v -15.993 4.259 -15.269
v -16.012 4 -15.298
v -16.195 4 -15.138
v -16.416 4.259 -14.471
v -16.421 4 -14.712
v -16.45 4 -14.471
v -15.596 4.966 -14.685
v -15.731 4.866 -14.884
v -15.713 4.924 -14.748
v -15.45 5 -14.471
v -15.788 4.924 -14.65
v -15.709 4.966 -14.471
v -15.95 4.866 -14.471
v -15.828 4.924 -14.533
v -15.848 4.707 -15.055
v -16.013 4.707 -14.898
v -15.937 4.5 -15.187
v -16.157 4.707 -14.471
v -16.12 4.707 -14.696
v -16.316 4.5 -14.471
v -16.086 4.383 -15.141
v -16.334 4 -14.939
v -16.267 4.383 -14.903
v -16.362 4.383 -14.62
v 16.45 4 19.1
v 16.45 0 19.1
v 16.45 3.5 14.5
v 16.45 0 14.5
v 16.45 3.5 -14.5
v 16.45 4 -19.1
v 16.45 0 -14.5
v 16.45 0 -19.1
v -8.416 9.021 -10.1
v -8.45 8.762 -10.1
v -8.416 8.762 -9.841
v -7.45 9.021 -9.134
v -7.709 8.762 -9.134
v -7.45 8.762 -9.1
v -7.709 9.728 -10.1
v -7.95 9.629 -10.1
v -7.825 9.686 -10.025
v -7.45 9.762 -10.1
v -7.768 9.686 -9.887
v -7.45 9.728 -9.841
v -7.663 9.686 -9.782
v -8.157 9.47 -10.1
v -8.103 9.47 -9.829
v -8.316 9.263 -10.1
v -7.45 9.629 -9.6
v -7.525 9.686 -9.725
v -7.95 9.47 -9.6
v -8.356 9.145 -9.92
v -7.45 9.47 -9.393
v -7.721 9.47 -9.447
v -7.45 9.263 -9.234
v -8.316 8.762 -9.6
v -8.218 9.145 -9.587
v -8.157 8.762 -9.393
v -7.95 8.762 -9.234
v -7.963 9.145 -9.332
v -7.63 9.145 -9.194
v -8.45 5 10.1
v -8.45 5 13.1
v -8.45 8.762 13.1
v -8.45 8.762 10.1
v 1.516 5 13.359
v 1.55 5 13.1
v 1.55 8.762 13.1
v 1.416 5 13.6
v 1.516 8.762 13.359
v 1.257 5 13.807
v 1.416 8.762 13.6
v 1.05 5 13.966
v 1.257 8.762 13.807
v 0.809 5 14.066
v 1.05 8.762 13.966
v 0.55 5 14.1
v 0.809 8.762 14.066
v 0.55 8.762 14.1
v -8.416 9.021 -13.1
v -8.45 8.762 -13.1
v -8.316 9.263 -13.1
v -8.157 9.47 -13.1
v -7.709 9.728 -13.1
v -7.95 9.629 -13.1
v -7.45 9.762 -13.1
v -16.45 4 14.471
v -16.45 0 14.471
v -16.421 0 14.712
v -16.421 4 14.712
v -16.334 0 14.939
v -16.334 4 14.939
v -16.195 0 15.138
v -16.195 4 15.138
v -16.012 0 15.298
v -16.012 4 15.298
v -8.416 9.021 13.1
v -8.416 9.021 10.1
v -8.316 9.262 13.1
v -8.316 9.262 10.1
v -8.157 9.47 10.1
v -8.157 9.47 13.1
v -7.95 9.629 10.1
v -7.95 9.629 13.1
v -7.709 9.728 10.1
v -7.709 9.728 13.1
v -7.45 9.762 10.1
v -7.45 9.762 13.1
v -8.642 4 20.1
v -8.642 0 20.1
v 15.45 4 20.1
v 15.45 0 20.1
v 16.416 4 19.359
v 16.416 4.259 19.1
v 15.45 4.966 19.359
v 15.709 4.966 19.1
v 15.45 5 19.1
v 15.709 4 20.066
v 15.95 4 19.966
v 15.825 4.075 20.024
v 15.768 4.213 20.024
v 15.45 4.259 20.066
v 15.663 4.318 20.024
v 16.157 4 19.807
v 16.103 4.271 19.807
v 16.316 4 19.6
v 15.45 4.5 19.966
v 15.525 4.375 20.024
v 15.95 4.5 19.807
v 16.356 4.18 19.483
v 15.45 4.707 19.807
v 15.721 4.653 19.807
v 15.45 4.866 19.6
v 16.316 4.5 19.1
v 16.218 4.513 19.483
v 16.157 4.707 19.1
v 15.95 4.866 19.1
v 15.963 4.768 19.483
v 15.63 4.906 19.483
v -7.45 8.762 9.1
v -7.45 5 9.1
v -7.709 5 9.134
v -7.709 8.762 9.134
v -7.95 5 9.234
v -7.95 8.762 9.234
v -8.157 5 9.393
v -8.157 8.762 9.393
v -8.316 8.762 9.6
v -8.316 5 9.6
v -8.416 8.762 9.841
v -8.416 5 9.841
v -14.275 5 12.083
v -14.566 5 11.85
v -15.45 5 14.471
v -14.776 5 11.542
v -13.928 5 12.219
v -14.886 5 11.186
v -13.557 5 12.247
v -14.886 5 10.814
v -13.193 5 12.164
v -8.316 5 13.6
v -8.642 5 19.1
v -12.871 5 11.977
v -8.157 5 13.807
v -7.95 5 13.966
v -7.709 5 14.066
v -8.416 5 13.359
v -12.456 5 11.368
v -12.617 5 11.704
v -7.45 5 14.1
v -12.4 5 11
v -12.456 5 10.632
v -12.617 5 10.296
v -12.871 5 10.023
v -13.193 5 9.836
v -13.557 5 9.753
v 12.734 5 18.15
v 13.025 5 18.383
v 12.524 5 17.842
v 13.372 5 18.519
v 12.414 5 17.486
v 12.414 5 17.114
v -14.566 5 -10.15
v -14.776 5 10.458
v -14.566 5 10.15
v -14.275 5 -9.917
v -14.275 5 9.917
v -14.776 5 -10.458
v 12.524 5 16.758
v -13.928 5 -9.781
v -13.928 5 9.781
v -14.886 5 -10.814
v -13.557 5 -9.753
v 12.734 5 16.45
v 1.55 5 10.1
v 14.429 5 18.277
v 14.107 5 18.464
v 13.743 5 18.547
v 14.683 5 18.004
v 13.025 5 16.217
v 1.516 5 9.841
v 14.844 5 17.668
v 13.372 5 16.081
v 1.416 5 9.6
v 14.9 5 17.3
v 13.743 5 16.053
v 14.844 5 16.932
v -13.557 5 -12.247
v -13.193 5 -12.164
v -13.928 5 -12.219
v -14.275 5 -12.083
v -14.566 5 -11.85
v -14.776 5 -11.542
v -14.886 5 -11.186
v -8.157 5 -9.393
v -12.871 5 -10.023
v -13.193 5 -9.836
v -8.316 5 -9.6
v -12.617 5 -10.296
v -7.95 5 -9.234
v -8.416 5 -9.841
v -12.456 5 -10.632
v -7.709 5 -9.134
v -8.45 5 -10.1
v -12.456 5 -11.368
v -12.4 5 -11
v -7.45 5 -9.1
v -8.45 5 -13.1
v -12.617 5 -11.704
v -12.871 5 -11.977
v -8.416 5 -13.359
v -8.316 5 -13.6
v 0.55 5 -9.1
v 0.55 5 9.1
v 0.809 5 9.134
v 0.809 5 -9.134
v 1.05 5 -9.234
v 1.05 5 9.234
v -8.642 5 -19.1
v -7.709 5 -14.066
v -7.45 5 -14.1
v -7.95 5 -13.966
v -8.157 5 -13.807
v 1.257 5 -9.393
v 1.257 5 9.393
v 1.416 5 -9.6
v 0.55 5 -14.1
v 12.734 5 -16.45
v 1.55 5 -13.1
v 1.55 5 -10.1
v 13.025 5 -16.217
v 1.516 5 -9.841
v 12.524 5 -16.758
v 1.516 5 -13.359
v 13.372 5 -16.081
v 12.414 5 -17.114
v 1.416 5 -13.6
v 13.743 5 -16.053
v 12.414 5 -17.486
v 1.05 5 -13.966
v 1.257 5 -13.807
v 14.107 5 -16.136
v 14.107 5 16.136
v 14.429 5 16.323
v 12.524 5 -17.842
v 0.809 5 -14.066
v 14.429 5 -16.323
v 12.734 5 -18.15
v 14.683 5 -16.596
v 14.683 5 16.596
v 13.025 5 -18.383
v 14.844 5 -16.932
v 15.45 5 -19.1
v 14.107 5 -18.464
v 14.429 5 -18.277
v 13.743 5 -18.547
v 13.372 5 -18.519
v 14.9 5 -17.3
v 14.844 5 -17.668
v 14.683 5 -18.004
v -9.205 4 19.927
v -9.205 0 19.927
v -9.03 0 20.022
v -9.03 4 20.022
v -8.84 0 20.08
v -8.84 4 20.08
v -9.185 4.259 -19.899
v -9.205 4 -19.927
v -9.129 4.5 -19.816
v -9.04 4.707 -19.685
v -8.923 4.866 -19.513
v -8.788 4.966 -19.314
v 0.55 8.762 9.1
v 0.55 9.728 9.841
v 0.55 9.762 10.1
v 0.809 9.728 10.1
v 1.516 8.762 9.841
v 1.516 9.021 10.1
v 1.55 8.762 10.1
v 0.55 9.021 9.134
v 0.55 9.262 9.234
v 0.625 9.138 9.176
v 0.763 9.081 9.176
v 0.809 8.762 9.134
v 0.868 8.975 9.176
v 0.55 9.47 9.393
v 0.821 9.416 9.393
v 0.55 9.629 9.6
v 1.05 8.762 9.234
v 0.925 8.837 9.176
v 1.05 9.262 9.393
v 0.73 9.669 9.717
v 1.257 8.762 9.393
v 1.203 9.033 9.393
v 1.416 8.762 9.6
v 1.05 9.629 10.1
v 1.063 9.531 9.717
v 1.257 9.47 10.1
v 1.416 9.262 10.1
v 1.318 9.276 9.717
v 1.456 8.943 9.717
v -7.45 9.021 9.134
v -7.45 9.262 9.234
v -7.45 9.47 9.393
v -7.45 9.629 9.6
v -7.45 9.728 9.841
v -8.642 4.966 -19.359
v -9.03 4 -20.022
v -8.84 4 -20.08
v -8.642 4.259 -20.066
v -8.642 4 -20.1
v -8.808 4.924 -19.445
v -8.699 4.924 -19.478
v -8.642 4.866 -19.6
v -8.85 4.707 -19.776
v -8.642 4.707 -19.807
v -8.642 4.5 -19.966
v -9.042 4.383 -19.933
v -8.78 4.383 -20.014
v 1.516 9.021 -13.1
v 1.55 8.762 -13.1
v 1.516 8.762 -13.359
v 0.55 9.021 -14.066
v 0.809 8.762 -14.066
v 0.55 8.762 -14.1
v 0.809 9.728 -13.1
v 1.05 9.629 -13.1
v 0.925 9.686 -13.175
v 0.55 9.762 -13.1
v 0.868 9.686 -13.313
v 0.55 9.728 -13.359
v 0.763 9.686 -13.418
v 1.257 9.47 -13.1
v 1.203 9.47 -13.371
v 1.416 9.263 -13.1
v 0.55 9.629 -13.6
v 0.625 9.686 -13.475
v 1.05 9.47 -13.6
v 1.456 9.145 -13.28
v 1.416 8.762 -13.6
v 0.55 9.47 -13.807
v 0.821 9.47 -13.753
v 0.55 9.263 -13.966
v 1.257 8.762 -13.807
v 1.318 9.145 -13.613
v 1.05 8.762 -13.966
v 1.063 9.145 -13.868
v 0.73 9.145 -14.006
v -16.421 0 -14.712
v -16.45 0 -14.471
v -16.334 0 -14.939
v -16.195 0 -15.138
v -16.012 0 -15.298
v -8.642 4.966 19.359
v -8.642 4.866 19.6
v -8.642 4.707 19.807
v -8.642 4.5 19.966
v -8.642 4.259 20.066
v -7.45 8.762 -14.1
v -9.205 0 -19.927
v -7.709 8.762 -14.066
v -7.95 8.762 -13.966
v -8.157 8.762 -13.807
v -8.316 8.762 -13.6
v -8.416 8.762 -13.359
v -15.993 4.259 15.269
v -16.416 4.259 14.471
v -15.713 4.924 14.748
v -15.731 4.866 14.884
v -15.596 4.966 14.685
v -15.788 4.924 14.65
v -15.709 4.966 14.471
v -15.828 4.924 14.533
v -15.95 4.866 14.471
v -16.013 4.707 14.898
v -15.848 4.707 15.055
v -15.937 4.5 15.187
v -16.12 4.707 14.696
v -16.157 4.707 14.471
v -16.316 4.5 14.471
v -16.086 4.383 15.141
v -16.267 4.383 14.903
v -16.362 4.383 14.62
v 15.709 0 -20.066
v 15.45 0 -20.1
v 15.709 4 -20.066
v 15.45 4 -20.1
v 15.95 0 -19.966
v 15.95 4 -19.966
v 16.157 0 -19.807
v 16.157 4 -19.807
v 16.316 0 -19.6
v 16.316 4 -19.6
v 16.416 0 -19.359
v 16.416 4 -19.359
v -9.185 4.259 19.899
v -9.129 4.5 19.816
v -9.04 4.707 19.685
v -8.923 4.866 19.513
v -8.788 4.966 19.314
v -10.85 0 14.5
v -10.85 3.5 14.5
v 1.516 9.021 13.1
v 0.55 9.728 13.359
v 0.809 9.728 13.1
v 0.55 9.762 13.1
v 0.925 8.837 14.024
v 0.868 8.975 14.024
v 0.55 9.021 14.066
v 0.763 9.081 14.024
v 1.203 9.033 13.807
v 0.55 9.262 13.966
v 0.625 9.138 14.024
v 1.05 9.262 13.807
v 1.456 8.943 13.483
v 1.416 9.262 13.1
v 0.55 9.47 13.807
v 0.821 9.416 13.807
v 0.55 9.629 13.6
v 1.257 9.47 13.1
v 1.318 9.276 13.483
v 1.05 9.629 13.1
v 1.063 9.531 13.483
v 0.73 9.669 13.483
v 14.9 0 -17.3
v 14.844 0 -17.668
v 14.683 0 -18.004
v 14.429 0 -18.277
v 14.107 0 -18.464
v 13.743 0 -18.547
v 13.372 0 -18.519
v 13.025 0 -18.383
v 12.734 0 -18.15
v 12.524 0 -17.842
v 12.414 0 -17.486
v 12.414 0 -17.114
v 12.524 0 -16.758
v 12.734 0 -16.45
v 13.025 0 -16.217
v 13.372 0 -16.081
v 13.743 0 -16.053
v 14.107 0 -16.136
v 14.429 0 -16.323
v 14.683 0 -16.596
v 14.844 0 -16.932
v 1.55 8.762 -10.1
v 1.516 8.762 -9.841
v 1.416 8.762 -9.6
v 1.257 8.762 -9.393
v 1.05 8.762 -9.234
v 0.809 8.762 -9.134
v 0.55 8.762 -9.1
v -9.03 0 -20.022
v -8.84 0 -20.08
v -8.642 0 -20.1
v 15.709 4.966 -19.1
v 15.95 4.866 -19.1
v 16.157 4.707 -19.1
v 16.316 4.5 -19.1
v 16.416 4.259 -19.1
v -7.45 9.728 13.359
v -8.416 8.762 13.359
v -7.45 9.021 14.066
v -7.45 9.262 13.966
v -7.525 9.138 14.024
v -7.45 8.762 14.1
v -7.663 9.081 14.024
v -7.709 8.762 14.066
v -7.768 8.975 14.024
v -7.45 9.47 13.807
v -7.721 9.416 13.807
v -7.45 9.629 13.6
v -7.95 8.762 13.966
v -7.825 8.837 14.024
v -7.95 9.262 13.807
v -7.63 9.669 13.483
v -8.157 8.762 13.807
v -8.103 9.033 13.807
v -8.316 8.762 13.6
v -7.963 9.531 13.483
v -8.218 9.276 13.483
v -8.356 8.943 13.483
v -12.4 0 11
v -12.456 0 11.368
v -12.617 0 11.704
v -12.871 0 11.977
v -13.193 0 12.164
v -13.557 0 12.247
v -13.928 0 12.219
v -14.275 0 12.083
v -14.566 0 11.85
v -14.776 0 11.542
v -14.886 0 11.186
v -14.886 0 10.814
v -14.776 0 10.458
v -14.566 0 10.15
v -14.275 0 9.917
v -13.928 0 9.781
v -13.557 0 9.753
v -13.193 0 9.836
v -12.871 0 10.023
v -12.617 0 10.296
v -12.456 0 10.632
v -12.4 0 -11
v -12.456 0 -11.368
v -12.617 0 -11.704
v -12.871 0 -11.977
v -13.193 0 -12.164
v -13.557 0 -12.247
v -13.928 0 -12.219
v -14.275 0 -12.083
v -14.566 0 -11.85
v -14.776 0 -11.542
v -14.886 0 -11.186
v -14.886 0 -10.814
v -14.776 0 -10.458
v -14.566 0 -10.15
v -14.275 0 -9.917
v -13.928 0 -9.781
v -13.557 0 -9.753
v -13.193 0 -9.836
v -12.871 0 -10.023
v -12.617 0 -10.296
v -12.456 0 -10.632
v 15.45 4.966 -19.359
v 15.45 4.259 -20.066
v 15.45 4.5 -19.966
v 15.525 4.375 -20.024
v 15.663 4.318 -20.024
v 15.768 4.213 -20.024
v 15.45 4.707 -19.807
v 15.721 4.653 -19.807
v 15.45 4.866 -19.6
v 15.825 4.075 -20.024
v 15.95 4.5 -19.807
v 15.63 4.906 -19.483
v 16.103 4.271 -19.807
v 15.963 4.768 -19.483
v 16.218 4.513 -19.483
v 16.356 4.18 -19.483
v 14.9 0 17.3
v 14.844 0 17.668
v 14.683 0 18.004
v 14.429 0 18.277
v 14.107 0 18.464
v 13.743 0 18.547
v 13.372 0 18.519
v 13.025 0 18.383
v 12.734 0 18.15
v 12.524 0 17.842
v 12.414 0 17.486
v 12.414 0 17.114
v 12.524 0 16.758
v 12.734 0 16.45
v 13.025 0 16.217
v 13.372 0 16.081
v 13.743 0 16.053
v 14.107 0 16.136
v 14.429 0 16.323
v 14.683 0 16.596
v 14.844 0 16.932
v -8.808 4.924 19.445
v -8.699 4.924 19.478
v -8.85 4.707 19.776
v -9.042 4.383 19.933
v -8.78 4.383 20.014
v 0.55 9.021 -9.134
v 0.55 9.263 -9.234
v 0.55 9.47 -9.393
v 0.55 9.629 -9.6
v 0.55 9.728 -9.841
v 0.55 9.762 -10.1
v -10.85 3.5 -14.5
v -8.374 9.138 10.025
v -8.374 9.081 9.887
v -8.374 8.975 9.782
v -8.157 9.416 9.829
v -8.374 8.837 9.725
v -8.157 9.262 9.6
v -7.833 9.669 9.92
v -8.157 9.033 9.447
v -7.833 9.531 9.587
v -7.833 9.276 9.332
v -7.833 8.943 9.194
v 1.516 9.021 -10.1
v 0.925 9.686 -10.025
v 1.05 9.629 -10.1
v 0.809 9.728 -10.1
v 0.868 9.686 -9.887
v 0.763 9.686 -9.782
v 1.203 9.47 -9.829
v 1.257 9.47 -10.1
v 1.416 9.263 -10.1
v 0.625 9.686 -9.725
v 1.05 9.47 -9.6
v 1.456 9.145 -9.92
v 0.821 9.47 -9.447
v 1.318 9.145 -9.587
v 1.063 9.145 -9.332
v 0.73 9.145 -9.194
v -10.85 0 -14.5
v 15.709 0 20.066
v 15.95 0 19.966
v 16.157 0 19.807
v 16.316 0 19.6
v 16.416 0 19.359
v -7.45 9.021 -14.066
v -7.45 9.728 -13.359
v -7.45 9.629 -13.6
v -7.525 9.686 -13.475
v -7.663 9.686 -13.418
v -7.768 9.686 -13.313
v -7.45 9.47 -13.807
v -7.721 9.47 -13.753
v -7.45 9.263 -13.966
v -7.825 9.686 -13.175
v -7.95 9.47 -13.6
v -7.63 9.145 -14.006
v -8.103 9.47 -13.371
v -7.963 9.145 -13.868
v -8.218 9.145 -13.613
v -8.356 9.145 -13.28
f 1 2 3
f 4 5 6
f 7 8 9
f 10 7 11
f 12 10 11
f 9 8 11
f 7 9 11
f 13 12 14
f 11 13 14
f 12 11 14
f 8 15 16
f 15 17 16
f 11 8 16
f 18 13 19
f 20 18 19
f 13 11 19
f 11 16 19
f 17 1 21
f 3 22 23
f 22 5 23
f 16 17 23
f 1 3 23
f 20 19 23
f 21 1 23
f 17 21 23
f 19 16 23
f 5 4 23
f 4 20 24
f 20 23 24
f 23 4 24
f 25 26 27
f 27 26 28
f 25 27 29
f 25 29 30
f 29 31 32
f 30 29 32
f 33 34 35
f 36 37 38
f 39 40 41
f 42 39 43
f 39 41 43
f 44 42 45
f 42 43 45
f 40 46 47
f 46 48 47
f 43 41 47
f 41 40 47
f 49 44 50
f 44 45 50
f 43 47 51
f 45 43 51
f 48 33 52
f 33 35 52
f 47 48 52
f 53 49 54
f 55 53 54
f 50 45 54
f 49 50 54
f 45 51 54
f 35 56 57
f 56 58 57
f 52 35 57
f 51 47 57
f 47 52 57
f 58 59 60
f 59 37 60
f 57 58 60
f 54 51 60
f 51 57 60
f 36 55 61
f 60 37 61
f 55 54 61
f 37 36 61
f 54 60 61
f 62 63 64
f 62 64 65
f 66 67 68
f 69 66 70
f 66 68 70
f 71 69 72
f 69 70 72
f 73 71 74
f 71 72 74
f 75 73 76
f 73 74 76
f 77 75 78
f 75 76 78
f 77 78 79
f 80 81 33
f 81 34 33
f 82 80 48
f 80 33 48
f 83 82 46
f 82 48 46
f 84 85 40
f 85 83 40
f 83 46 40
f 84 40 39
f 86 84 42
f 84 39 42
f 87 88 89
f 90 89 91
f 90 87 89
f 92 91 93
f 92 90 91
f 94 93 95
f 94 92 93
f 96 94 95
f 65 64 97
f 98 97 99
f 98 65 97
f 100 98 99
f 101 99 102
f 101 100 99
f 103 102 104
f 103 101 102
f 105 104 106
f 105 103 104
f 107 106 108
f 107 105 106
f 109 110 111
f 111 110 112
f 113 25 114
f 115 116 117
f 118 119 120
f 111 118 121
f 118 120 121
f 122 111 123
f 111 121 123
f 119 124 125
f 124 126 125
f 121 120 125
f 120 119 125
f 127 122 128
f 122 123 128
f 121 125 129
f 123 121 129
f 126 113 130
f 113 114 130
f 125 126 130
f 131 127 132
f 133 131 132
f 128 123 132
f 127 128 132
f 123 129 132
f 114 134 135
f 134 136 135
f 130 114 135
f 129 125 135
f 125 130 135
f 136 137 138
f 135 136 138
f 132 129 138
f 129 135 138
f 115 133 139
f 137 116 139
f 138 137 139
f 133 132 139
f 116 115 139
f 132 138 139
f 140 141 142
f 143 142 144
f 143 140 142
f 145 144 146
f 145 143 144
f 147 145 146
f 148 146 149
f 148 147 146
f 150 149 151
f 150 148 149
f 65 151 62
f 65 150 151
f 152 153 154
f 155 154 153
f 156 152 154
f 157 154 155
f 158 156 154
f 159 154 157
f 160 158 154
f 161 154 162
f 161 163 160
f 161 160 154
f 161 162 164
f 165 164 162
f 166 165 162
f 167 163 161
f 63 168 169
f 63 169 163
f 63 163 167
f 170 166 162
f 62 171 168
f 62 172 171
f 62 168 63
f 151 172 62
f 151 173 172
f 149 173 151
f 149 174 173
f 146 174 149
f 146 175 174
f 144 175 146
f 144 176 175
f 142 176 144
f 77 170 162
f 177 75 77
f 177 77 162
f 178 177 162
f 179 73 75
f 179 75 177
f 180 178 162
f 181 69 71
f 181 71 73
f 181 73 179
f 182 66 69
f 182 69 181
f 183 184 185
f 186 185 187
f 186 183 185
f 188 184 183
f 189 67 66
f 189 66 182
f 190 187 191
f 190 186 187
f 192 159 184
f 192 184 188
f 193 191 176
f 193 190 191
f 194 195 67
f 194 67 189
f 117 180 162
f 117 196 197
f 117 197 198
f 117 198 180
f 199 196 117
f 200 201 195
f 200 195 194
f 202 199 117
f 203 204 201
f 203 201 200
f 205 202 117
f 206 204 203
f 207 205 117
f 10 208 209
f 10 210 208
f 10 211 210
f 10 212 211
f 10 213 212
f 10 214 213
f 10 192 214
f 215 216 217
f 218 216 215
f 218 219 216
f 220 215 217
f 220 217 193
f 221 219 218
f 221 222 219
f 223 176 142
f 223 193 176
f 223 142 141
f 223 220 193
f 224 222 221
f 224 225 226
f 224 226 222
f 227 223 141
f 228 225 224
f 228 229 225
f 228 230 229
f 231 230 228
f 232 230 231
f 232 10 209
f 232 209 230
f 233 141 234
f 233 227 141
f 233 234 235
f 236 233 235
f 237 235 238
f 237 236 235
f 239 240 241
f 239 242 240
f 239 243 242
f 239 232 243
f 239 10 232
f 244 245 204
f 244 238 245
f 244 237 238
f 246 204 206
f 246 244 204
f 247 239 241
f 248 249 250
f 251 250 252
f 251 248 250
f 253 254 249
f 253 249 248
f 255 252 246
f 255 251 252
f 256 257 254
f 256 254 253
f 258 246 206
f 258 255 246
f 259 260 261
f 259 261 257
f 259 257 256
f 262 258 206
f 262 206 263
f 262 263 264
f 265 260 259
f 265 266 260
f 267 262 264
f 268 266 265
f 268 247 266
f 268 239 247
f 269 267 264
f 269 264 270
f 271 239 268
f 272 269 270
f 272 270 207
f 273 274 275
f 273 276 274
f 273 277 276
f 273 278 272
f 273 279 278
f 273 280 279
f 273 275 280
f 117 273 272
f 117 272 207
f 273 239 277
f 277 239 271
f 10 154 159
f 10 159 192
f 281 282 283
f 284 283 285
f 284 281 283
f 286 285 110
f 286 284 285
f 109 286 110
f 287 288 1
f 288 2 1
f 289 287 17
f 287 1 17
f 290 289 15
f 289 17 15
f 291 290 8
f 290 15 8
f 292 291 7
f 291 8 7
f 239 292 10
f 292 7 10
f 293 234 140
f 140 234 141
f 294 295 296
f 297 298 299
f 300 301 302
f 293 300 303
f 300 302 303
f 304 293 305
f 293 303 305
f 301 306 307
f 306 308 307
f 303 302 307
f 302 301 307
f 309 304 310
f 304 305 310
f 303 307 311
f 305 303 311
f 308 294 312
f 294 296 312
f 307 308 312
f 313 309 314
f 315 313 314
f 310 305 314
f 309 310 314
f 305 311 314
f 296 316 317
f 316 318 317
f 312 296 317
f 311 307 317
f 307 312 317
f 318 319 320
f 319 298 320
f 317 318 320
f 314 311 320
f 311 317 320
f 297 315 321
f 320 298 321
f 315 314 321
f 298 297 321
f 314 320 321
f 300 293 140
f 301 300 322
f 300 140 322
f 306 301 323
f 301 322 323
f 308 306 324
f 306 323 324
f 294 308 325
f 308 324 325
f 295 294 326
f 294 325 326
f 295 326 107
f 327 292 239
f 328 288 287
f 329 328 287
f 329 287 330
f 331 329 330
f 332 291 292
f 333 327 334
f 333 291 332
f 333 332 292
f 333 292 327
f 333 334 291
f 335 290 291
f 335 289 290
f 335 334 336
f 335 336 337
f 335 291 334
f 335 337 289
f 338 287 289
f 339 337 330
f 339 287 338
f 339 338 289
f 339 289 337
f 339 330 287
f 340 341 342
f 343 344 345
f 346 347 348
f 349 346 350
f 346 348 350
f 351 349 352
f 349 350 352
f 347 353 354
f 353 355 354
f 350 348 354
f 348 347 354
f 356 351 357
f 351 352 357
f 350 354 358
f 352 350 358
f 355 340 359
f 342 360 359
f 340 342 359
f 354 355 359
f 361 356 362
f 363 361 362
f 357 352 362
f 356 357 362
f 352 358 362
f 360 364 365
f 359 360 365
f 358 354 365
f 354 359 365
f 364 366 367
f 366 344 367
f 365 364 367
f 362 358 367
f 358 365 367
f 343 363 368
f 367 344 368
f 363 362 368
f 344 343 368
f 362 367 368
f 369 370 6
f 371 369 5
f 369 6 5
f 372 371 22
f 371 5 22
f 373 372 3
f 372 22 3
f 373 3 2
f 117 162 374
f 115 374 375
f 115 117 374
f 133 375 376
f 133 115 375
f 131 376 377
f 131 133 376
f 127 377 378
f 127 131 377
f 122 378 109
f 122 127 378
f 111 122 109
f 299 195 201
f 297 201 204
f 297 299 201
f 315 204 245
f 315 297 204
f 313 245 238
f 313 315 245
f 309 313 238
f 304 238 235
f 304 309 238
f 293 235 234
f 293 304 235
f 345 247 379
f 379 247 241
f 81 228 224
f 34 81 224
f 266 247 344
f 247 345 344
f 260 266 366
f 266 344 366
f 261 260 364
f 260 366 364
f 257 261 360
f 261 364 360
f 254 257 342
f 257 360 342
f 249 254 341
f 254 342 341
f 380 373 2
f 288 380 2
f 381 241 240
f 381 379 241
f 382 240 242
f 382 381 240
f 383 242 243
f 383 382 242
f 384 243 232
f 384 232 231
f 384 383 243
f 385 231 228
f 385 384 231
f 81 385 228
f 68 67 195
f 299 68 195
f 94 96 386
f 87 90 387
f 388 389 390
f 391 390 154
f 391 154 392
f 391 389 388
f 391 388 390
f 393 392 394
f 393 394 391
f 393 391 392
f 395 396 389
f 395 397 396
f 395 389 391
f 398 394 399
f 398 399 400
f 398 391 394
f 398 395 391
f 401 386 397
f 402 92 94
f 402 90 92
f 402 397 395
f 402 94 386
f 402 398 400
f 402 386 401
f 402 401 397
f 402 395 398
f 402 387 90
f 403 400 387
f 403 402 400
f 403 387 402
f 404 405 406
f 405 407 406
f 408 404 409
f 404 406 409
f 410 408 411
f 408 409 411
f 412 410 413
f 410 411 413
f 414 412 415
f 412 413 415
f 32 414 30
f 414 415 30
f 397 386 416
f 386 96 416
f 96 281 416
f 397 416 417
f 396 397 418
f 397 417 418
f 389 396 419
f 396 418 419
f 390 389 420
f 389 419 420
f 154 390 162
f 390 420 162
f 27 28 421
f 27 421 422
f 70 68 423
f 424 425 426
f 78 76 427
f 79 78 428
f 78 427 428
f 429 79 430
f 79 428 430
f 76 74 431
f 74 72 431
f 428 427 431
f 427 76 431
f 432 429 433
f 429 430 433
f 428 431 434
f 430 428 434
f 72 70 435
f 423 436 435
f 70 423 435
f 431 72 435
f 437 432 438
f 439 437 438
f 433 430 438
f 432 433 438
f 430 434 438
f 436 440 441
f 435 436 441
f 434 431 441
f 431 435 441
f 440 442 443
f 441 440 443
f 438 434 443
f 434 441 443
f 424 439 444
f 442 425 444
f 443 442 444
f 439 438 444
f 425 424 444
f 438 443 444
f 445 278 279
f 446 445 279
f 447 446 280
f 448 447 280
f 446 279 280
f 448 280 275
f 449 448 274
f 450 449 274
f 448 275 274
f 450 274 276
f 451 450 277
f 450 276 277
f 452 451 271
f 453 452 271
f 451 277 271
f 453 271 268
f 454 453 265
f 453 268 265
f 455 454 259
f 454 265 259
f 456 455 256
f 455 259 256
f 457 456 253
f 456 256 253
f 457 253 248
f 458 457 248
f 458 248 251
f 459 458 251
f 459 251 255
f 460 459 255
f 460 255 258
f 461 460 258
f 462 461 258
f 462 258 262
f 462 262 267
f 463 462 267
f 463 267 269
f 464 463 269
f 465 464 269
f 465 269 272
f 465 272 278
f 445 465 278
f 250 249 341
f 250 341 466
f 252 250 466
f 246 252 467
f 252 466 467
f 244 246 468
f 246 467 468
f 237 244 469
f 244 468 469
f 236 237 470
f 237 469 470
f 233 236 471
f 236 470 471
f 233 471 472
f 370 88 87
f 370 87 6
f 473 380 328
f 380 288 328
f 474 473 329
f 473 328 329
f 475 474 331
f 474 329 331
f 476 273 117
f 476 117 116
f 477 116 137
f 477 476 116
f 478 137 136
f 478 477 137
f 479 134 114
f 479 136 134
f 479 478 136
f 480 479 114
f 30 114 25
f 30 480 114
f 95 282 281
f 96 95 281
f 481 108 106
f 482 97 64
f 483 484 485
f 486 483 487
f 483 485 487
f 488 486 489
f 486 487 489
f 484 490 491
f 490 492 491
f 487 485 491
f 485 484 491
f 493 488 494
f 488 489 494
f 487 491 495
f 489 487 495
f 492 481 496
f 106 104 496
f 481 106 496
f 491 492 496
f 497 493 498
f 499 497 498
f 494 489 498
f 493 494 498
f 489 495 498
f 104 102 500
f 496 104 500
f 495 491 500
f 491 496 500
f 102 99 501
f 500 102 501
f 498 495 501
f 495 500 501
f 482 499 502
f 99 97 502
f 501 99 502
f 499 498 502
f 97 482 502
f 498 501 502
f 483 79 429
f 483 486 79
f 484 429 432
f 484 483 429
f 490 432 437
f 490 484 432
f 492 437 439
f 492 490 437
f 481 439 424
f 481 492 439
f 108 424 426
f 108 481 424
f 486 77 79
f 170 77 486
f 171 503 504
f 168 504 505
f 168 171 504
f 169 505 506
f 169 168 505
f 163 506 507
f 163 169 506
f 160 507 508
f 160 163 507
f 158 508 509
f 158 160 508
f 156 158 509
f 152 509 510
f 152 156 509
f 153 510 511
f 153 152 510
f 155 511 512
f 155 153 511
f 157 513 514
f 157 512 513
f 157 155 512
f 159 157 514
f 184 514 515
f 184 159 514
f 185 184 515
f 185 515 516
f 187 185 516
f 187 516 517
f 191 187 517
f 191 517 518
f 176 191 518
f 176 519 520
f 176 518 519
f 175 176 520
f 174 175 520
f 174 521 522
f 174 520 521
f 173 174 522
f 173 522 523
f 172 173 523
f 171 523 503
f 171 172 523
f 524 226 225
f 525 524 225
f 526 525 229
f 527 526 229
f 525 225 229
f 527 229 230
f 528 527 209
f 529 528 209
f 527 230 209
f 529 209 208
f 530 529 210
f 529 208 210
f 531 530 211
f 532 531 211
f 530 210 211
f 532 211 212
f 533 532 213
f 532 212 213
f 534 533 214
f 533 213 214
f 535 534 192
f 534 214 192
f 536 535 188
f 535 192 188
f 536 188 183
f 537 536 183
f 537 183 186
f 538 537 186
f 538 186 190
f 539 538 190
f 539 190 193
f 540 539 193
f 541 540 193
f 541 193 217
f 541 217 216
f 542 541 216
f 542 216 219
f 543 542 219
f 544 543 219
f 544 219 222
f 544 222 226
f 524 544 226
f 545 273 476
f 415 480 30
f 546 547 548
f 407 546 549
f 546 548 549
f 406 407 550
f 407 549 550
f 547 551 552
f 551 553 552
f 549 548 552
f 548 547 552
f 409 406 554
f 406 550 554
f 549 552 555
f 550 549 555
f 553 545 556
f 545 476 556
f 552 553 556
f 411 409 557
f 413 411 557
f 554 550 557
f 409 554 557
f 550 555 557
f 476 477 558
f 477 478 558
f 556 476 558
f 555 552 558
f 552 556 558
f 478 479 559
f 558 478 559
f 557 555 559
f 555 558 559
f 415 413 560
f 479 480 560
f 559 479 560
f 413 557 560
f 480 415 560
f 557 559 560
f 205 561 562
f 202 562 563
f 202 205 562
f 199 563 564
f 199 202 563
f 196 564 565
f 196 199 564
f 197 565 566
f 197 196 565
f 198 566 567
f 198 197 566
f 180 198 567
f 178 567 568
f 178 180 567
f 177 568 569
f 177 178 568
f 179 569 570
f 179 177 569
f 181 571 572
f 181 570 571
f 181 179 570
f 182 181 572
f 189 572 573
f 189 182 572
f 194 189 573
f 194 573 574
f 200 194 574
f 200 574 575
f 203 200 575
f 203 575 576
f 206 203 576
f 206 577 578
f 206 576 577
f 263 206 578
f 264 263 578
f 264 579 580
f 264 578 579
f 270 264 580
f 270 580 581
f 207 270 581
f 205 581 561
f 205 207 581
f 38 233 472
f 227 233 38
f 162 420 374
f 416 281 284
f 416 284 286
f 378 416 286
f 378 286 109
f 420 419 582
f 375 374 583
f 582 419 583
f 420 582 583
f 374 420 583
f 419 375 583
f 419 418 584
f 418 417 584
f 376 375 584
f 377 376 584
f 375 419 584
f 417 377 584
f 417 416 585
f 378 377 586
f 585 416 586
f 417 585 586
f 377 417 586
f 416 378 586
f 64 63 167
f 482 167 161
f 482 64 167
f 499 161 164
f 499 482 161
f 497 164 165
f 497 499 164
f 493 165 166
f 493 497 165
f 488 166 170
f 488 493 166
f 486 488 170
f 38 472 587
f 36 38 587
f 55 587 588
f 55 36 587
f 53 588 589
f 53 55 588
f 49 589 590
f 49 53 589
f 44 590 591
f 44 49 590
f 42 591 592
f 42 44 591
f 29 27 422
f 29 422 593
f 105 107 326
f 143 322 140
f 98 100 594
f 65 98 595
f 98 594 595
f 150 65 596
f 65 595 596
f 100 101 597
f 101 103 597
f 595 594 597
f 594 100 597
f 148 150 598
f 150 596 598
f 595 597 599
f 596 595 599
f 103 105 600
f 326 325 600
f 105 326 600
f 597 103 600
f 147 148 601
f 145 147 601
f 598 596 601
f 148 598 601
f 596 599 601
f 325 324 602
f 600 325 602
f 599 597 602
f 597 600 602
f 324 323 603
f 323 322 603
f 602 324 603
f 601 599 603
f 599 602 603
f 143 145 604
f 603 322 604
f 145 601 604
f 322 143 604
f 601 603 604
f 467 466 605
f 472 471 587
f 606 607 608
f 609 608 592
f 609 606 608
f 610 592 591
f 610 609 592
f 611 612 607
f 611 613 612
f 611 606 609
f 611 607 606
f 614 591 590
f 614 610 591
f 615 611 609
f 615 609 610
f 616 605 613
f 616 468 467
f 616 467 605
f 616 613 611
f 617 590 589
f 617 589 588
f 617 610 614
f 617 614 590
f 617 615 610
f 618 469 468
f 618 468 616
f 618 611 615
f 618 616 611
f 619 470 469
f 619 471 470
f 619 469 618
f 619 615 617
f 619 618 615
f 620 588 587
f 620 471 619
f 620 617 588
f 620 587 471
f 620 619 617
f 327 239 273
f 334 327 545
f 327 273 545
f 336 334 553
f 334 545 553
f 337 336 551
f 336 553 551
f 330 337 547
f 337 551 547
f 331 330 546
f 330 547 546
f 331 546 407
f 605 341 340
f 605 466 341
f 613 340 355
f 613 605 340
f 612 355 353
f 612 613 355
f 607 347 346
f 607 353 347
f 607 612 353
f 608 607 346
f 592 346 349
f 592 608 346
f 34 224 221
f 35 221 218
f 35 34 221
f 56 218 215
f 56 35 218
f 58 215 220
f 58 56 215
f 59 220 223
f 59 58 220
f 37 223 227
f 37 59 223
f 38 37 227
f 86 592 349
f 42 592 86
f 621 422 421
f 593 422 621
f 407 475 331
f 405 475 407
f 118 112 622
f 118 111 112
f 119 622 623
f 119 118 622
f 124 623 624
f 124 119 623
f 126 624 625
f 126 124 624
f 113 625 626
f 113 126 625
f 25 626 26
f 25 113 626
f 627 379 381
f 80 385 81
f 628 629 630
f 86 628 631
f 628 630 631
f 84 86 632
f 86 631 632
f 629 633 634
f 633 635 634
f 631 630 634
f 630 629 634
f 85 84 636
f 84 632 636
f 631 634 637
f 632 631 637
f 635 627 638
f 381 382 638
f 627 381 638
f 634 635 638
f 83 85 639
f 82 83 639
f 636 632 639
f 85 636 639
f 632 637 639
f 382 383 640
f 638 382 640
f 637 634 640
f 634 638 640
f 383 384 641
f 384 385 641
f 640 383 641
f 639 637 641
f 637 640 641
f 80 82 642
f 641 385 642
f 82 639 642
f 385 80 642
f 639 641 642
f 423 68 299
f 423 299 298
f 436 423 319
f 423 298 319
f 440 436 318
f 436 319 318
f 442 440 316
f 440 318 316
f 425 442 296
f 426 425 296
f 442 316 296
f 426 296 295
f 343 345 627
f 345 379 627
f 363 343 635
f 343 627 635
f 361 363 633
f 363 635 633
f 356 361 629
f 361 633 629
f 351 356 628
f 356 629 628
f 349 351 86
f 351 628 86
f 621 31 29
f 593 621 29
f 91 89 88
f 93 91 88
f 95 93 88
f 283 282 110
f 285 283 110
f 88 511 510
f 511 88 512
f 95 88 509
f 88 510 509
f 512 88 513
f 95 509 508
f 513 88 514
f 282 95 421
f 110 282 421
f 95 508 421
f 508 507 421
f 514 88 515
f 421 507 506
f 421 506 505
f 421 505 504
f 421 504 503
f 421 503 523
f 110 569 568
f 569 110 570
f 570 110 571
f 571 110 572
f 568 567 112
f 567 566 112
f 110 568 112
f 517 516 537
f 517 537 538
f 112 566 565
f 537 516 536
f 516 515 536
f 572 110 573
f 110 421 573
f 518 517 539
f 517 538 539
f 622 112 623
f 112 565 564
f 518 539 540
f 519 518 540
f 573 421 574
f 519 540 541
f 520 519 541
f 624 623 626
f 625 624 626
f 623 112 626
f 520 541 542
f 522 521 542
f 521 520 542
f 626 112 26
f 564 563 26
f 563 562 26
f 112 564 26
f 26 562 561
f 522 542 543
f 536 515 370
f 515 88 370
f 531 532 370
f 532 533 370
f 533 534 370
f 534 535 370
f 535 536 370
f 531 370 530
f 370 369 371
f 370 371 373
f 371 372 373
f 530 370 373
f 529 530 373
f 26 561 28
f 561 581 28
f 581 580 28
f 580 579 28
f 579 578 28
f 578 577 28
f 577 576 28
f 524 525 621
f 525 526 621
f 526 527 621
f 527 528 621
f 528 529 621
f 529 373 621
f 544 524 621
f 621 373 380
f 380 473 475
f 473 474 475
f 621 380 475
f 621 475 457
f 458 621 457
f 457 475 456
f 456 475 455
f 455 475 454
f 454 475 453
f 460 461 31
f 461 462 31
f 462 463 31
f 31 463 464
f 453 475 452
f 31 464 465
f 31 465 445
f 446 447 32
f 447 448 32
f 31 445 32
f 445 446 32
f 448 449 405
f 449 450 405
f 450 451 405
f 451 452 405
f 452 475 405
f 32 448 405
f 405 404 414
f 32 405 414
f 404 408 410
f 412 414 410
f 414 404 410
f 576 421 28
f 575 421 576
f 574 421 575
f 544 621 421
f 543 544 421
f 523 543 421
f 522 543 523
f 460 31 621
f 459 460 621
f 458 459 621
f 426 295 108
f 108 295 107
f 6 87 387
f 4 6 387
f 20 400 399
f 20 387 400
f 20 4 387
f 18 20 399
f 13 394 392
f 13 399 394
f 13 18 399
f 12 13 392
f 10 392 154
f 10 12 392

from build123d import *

# Parameters (mm, degrees)
SKETCH1_W           = 32.9
SKETCH1_H           = 40.2
BOSS_EXTRUDE1_DEPTH = 5
SKETCH2_W           = 29
SKETCH2_H           = 3.5
CUT_EXTRUDE1_DEPTH  = 27.3
SKETCH3_R           = 1.25
CUT_EXTRUDE2_DEPTH  = 6
SKETCH4_W           = 10
SKETCH4_H           = 5
BOSS_EXTRUDE2_DEPTH = 4.7625
CHAMFER1_SIZE       = 7.5
CHAMFER1_SIZE2      = 5.1
CHAMFER2_SIZE       = 5.1
CHAMFER2_SIZE2      = 7.5
FILLET1_R           = 1


with BuildPart() as part:
    # Sketch1 → Boss-Extrude1 (new body)
    with BuildSketch(Plane(origin=(0, 0, 0), x_dir=(1, 0, 0), z_dir=(0, 1, 0))):
        Rectangle(SKETCH1_W, SKETCH1_H)
    extrude(amount=BOSS_EXTRUDE1_DEPTH)

    # Sketch2 → Cut-Extrude1 (cut)
    with BuildSketch(Plane(origin=(16.45, 0, 0), x_dir=(0, 0, -1), z_dir=(1, 0, 0))):
        with Locations((0, 1.75)):
            Rectangle(SKETCH2_W, SKETCH2_H)
    extrude(amount=-CUT_EXTRUDE1_DEPTH, mode=Mode.SUBTRACT)

    # Sketch3 → Cut-Extrude2 (cut, through all)
    with BuildSketch(Plane(origin=(0, 5, 0), x_dir=(1, 0, 0), z_dir=(0, 1, 0))):
        with Locations((13.65, 17.3)):
            Circle(SKETCH3_R)
        with Locations((-13.65, 11)):
            Circle(SKETCH3_R)
    cut_extrude2 = extrude(amount=-CUT_EXTRUDE2_DEPTH, mode=Mode.SUBTRACT)

    # Sketch4 → Boss-Extrude2 (add)
    with BuildSketch(Plane(origin=(0, 5, 0), x_dir=(-1, 0, 0), z_dir=(0, 1, 0))):
        with Locations((3.45, -11.6)):
            Rectangle(SKETCH4_W, SKETCH4_H)
    boss_extrude2 = extrude(amount=BOSS_EXTRUDE2_DEPTH)

    # Mirror1: Cut-Extrude2, Boss-Extrude2 across plane
    add(cut_extrude2.mirror(Plane.XY), mode=Mode.SUBTRACT)
    add(boss_extrude2.mirror(Plane.XY))

    # Chamfer1
    chamfer1_edges = [part.edges().sort_by_distance(p)[0] for p in [
        (-16.45, 2.5, -20.1),
    ]]
    chamfer1_side = [part.faces().sort_by_distance(p)[0] for p in [
        (0, 2.5, -20.1),
    ]]
    chamfer(chamfer1_edges, length=CHAMFER1_SIZE, length2=CHAMFER1_SIZE2, reference=chamfer1_side[0])

    # Chamfer2
    chamfer2_edges = [part.edges().sort_by_distance(p)[0] for p in [
        (-16.45, 2.5, 20.1),
    ]]
    chamfer2_side = [part.faces().sort_by_distance(p)[0] for p in [
        (-16.45, 2.5, 2.55),
    ]]
    chamfer(chamfer2_edges, length=CHAMFER2_SIZE, length2=CHAMFER2_SIZE2, reference=chamfer2_side[0])

    # Fillet1
    fillet1_edges = [part.edges().sort_by_distance(p)[0] for p in [
        (1.55, 7.38125, -9.1),
        (1.55, 7.38125, -14.1),
        (16.45, 5, 0),
        (-8.45, 7.38125, -14.1),
        (-8.45, 7.38125, -9.1),
        (1.55, 9.7625, -11.6),
        (-3.45, 9.7625, -14.1),
        (-8.45, 9.7625, -11.6),
        (-3.45, 9.7625, -9.1),
        (1.55, 9.7625, 11.6),
        (1.55, 7.38125, 14.1),
        (-3.45, 9.7625, 9.1),
        (1.55, 7.38125, 9.1),
        (-8.45, 9.7625, 11.6),
        (-8.45, 7.38125, 9.1),
        (-3.45, 9.7625, 14.1),
        (-8.45, 7.38125, 14.1),
        (3.75, 5, -20.1),
        (-16.45, 5, 0),
        (-16.45, 2.5, -15),
        (-8.95, 2.5, -20.1),
        (-12.7, 5, -17.55),
        (16.45, 2.5, 20.1),
        (3.75, 5, 20.1),
        (-8.95, 2.5, 20.1),
        (16.45, 2.5, -20.1),
        (-16.45, 2.5, 15),
        (-12.7, 5, 17.55),
    ]]
    fillet(fillet1_edges, radius=FILLET1_R)


solid = part.part
